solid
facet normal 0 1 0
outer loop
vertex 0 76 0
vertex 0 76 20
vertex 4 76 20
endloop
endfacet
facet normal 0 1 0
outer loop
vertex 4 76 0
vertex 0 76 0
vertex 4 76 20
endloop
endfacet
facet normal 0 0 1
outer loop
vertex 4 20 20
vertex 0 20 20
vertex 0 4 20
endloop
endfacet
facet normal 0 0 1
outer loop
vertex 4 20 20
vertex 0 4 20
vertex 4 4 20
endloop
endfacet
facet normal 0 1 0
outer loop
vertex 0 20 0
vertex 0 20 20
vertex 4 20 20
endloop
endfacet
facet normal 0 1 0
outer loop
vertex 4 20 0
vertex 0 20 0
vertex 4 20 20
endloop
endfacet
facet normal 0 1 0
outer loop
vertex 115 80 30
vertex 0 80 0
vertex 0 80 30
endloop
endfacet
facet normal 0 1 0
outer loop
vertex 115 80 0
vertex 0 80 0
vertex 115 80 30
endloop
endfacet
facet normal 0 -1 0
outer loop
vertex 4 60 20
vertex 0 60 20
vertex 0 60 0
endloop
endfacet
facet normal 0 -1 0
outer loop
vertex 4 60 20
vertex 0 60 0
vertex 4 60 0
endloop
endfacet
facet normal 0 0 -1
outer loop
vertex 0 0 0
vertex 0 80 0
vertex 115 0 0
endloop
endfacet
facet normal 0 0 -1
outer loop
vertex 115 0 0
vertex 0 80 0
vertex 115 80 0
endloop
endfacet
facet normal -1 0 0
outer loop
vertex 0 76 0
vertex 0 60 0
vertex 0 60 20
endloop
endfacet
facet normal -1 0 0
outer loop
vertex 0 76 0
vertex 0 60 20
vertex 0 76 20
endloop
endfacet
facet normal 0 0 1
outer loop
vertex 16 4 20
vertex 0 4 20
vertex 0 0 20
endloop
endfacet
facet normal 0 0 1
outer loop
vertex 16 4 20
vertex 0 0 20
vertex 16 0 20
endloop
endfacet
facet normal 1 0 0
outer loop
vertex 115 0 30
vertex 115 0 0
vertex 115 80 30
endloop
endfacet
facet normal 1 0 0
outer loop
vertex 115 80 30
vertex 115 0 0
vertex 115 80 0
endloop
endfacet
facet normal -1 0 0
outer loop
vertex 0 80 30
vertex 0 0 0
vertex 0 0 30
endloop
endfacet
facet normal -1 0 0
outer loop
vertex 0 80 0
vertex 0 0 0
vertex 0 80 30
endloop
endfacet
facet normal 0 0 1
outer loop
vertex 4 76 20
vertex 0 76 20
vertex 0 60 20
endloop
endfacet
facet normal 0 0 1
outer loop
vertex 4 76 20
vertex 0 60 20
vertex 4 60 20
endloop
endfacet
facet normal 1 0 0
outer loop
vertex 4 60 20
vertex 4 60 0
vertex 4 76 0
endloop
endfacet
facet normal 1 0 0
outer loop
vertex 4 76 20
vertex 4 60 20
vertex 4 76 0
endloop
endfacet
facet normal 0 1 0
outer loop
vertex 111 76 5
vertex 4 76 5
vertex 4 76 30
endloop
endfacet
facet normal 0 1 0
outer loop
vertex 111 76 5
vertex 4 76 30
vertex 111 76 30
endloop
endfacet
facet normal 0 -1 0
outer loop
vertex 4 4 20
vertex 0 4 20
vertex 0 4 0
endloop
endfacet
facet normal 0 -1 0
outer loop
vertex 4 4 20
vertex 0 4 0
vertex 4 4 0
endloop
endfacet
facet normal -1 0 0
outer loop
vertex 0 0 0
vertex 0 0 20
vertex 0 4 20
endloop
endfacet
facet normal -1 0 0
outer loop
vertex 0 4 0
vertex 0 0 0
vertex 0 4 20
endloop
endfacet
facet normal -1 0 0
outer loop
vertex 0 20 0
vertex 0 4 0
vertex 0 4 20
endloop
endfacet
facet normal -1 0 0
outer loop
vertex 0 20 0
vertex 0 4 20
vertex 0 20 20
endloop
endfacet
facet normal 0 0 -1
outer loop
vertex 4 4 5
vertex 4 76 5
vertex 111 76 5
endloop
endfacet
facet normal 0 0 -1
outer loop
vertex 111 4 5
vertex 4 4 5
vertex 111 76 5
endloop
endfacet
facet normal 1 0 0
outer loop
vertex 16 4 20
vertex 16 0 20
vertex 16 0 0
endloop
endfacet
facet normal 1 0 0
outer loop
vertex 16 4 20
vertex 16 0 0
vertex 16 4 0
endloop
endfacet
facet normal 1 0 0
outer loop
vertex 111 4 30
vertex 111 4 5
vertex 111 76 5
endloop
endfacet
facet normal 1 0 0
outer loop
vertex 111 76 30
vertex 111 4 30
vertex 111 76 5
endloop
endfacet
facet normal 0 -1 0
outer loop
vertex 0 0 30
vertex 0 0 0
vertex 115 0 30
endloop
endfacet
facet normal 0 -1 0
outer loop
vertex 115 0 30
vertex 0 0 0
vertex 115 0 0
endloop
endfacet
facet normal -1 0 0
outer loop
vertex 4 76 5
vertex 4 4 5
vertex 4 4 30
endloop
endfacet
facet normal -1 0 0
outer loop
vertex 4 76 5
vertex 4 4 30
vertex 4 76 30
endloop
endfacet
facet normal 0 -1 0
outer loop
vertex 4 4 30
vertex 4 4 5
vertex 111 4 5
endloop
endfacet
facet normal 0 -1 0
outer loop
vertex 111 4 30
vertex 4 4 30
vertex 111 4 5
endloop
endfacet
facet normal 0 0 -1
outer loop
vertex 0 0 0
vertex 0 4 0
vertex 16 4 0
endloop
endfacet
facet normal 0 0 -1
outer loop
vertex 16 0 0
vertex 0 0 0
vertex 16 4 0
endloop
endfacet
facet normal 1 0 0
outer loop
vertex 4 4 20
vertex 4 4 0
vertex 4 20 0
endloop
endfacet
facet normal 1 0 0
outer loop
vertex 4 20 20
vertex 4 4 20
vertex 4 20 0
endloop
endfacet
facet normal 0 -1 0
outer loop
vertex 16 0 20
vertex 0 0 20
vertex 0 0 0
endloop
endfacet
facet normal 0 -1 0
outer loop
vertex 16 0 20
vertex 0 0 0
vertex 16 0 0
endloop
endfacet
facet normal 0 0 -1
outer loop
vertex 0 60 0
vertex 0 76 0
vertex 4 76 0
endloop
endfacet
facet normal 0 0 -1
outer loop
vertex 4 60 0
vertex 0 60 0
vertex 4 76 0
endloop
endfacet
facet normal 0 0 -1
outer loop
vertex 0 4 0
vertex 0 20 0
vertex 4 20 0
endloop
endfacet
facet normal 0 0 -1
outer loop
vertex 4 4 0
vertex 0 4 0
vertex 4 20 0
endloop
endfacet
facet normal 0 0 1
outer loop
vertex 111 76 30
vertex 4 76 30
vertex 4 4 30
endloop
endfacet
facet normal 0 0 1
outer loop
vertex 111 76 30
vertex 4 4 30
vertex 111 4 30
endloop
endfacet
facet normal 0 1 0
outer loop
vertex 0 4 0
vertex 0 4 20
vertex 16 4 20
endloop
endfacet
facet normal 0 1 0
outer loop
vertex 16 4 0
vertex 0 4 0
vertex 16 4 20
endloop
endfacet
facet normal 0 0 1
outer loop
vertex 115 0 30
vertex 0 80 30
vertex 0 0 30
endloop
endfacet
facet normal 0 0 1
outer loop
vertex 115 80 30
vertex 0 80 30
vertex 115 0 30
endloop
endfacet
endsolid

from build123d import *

# Parameters (mm, degrees)
BOX_W        = 115
BOX_H        = 80
BOX_DEPTH    = 30
BOX001_W     = 107
BOX001_H     = 72
BOX001_DEPTH = 25
BOX002_W     = 4
BOX002_H     = 16
BOX002_DEPTH = 20
BOX003_W     = 4
BOX003_H     = 16
BOX003_DEPTH = 20
BOX004_W     = 16
BOX004_H     = 4
BOX004_DEPTH = 20


with BuildPart() as basis:
    # Box → Box (new body)
    with BuildSketch(Plane.XY):
        with Locations((57.5, 40)):
            Rectangle(BOX_W, BOX_H)
    extrude(amount=BOX_DEPTH)


with BuildPart() as basis_cut:
    # Box001 → Box001 (new body)
    with BuildSketch(Plane(origin=(4, 4, 5), x_dir=(1, 0, 0), z_dir=(0, 0, 1))):
        with Locations((53.5, 36)):
            Rectangle(BOX001_W, BOX001_H)
    extrude(amount=BOX001_DEPTH)


with BuildPart() as solar:
    # Box002 → Box002 (new body)
    with BuildSketch(Plane(origin=(0, 4, 0), x_dir=(1, 0, 0), z_dir=(0, 0, 1))):
        with Locations((2, 8)):
            Rectangle(BOX002_W, BOX002_H)
    extrude(amount=BOX002_DEPTH)


with BuildPart() as antenne:
    # Box003 → Box003 (new body)
    with BuildSketch(Plane(origin=(0, 60, 0), x_dir=(1, 0, 0), z_dir=(0, 0, 1))):
        with Locations((2, 8)):
            Rectangle(BOX003_W, BOX003_H)
    extrude(amount=BOX003_DEPTH)


with BuildPart() as luftsensor:
    # Box004 → Box004 (new body)
    with BuildSketch(Plane.XY):
        with Locations((8, 2)):
            Rectangle(BOX004_W, BOX004_H)
    extrude(amount=BOX004_DEPTH)


solid = Compound([basis.part, basis_cut.part, solar.part, antenne.part, luftsensor.part])
